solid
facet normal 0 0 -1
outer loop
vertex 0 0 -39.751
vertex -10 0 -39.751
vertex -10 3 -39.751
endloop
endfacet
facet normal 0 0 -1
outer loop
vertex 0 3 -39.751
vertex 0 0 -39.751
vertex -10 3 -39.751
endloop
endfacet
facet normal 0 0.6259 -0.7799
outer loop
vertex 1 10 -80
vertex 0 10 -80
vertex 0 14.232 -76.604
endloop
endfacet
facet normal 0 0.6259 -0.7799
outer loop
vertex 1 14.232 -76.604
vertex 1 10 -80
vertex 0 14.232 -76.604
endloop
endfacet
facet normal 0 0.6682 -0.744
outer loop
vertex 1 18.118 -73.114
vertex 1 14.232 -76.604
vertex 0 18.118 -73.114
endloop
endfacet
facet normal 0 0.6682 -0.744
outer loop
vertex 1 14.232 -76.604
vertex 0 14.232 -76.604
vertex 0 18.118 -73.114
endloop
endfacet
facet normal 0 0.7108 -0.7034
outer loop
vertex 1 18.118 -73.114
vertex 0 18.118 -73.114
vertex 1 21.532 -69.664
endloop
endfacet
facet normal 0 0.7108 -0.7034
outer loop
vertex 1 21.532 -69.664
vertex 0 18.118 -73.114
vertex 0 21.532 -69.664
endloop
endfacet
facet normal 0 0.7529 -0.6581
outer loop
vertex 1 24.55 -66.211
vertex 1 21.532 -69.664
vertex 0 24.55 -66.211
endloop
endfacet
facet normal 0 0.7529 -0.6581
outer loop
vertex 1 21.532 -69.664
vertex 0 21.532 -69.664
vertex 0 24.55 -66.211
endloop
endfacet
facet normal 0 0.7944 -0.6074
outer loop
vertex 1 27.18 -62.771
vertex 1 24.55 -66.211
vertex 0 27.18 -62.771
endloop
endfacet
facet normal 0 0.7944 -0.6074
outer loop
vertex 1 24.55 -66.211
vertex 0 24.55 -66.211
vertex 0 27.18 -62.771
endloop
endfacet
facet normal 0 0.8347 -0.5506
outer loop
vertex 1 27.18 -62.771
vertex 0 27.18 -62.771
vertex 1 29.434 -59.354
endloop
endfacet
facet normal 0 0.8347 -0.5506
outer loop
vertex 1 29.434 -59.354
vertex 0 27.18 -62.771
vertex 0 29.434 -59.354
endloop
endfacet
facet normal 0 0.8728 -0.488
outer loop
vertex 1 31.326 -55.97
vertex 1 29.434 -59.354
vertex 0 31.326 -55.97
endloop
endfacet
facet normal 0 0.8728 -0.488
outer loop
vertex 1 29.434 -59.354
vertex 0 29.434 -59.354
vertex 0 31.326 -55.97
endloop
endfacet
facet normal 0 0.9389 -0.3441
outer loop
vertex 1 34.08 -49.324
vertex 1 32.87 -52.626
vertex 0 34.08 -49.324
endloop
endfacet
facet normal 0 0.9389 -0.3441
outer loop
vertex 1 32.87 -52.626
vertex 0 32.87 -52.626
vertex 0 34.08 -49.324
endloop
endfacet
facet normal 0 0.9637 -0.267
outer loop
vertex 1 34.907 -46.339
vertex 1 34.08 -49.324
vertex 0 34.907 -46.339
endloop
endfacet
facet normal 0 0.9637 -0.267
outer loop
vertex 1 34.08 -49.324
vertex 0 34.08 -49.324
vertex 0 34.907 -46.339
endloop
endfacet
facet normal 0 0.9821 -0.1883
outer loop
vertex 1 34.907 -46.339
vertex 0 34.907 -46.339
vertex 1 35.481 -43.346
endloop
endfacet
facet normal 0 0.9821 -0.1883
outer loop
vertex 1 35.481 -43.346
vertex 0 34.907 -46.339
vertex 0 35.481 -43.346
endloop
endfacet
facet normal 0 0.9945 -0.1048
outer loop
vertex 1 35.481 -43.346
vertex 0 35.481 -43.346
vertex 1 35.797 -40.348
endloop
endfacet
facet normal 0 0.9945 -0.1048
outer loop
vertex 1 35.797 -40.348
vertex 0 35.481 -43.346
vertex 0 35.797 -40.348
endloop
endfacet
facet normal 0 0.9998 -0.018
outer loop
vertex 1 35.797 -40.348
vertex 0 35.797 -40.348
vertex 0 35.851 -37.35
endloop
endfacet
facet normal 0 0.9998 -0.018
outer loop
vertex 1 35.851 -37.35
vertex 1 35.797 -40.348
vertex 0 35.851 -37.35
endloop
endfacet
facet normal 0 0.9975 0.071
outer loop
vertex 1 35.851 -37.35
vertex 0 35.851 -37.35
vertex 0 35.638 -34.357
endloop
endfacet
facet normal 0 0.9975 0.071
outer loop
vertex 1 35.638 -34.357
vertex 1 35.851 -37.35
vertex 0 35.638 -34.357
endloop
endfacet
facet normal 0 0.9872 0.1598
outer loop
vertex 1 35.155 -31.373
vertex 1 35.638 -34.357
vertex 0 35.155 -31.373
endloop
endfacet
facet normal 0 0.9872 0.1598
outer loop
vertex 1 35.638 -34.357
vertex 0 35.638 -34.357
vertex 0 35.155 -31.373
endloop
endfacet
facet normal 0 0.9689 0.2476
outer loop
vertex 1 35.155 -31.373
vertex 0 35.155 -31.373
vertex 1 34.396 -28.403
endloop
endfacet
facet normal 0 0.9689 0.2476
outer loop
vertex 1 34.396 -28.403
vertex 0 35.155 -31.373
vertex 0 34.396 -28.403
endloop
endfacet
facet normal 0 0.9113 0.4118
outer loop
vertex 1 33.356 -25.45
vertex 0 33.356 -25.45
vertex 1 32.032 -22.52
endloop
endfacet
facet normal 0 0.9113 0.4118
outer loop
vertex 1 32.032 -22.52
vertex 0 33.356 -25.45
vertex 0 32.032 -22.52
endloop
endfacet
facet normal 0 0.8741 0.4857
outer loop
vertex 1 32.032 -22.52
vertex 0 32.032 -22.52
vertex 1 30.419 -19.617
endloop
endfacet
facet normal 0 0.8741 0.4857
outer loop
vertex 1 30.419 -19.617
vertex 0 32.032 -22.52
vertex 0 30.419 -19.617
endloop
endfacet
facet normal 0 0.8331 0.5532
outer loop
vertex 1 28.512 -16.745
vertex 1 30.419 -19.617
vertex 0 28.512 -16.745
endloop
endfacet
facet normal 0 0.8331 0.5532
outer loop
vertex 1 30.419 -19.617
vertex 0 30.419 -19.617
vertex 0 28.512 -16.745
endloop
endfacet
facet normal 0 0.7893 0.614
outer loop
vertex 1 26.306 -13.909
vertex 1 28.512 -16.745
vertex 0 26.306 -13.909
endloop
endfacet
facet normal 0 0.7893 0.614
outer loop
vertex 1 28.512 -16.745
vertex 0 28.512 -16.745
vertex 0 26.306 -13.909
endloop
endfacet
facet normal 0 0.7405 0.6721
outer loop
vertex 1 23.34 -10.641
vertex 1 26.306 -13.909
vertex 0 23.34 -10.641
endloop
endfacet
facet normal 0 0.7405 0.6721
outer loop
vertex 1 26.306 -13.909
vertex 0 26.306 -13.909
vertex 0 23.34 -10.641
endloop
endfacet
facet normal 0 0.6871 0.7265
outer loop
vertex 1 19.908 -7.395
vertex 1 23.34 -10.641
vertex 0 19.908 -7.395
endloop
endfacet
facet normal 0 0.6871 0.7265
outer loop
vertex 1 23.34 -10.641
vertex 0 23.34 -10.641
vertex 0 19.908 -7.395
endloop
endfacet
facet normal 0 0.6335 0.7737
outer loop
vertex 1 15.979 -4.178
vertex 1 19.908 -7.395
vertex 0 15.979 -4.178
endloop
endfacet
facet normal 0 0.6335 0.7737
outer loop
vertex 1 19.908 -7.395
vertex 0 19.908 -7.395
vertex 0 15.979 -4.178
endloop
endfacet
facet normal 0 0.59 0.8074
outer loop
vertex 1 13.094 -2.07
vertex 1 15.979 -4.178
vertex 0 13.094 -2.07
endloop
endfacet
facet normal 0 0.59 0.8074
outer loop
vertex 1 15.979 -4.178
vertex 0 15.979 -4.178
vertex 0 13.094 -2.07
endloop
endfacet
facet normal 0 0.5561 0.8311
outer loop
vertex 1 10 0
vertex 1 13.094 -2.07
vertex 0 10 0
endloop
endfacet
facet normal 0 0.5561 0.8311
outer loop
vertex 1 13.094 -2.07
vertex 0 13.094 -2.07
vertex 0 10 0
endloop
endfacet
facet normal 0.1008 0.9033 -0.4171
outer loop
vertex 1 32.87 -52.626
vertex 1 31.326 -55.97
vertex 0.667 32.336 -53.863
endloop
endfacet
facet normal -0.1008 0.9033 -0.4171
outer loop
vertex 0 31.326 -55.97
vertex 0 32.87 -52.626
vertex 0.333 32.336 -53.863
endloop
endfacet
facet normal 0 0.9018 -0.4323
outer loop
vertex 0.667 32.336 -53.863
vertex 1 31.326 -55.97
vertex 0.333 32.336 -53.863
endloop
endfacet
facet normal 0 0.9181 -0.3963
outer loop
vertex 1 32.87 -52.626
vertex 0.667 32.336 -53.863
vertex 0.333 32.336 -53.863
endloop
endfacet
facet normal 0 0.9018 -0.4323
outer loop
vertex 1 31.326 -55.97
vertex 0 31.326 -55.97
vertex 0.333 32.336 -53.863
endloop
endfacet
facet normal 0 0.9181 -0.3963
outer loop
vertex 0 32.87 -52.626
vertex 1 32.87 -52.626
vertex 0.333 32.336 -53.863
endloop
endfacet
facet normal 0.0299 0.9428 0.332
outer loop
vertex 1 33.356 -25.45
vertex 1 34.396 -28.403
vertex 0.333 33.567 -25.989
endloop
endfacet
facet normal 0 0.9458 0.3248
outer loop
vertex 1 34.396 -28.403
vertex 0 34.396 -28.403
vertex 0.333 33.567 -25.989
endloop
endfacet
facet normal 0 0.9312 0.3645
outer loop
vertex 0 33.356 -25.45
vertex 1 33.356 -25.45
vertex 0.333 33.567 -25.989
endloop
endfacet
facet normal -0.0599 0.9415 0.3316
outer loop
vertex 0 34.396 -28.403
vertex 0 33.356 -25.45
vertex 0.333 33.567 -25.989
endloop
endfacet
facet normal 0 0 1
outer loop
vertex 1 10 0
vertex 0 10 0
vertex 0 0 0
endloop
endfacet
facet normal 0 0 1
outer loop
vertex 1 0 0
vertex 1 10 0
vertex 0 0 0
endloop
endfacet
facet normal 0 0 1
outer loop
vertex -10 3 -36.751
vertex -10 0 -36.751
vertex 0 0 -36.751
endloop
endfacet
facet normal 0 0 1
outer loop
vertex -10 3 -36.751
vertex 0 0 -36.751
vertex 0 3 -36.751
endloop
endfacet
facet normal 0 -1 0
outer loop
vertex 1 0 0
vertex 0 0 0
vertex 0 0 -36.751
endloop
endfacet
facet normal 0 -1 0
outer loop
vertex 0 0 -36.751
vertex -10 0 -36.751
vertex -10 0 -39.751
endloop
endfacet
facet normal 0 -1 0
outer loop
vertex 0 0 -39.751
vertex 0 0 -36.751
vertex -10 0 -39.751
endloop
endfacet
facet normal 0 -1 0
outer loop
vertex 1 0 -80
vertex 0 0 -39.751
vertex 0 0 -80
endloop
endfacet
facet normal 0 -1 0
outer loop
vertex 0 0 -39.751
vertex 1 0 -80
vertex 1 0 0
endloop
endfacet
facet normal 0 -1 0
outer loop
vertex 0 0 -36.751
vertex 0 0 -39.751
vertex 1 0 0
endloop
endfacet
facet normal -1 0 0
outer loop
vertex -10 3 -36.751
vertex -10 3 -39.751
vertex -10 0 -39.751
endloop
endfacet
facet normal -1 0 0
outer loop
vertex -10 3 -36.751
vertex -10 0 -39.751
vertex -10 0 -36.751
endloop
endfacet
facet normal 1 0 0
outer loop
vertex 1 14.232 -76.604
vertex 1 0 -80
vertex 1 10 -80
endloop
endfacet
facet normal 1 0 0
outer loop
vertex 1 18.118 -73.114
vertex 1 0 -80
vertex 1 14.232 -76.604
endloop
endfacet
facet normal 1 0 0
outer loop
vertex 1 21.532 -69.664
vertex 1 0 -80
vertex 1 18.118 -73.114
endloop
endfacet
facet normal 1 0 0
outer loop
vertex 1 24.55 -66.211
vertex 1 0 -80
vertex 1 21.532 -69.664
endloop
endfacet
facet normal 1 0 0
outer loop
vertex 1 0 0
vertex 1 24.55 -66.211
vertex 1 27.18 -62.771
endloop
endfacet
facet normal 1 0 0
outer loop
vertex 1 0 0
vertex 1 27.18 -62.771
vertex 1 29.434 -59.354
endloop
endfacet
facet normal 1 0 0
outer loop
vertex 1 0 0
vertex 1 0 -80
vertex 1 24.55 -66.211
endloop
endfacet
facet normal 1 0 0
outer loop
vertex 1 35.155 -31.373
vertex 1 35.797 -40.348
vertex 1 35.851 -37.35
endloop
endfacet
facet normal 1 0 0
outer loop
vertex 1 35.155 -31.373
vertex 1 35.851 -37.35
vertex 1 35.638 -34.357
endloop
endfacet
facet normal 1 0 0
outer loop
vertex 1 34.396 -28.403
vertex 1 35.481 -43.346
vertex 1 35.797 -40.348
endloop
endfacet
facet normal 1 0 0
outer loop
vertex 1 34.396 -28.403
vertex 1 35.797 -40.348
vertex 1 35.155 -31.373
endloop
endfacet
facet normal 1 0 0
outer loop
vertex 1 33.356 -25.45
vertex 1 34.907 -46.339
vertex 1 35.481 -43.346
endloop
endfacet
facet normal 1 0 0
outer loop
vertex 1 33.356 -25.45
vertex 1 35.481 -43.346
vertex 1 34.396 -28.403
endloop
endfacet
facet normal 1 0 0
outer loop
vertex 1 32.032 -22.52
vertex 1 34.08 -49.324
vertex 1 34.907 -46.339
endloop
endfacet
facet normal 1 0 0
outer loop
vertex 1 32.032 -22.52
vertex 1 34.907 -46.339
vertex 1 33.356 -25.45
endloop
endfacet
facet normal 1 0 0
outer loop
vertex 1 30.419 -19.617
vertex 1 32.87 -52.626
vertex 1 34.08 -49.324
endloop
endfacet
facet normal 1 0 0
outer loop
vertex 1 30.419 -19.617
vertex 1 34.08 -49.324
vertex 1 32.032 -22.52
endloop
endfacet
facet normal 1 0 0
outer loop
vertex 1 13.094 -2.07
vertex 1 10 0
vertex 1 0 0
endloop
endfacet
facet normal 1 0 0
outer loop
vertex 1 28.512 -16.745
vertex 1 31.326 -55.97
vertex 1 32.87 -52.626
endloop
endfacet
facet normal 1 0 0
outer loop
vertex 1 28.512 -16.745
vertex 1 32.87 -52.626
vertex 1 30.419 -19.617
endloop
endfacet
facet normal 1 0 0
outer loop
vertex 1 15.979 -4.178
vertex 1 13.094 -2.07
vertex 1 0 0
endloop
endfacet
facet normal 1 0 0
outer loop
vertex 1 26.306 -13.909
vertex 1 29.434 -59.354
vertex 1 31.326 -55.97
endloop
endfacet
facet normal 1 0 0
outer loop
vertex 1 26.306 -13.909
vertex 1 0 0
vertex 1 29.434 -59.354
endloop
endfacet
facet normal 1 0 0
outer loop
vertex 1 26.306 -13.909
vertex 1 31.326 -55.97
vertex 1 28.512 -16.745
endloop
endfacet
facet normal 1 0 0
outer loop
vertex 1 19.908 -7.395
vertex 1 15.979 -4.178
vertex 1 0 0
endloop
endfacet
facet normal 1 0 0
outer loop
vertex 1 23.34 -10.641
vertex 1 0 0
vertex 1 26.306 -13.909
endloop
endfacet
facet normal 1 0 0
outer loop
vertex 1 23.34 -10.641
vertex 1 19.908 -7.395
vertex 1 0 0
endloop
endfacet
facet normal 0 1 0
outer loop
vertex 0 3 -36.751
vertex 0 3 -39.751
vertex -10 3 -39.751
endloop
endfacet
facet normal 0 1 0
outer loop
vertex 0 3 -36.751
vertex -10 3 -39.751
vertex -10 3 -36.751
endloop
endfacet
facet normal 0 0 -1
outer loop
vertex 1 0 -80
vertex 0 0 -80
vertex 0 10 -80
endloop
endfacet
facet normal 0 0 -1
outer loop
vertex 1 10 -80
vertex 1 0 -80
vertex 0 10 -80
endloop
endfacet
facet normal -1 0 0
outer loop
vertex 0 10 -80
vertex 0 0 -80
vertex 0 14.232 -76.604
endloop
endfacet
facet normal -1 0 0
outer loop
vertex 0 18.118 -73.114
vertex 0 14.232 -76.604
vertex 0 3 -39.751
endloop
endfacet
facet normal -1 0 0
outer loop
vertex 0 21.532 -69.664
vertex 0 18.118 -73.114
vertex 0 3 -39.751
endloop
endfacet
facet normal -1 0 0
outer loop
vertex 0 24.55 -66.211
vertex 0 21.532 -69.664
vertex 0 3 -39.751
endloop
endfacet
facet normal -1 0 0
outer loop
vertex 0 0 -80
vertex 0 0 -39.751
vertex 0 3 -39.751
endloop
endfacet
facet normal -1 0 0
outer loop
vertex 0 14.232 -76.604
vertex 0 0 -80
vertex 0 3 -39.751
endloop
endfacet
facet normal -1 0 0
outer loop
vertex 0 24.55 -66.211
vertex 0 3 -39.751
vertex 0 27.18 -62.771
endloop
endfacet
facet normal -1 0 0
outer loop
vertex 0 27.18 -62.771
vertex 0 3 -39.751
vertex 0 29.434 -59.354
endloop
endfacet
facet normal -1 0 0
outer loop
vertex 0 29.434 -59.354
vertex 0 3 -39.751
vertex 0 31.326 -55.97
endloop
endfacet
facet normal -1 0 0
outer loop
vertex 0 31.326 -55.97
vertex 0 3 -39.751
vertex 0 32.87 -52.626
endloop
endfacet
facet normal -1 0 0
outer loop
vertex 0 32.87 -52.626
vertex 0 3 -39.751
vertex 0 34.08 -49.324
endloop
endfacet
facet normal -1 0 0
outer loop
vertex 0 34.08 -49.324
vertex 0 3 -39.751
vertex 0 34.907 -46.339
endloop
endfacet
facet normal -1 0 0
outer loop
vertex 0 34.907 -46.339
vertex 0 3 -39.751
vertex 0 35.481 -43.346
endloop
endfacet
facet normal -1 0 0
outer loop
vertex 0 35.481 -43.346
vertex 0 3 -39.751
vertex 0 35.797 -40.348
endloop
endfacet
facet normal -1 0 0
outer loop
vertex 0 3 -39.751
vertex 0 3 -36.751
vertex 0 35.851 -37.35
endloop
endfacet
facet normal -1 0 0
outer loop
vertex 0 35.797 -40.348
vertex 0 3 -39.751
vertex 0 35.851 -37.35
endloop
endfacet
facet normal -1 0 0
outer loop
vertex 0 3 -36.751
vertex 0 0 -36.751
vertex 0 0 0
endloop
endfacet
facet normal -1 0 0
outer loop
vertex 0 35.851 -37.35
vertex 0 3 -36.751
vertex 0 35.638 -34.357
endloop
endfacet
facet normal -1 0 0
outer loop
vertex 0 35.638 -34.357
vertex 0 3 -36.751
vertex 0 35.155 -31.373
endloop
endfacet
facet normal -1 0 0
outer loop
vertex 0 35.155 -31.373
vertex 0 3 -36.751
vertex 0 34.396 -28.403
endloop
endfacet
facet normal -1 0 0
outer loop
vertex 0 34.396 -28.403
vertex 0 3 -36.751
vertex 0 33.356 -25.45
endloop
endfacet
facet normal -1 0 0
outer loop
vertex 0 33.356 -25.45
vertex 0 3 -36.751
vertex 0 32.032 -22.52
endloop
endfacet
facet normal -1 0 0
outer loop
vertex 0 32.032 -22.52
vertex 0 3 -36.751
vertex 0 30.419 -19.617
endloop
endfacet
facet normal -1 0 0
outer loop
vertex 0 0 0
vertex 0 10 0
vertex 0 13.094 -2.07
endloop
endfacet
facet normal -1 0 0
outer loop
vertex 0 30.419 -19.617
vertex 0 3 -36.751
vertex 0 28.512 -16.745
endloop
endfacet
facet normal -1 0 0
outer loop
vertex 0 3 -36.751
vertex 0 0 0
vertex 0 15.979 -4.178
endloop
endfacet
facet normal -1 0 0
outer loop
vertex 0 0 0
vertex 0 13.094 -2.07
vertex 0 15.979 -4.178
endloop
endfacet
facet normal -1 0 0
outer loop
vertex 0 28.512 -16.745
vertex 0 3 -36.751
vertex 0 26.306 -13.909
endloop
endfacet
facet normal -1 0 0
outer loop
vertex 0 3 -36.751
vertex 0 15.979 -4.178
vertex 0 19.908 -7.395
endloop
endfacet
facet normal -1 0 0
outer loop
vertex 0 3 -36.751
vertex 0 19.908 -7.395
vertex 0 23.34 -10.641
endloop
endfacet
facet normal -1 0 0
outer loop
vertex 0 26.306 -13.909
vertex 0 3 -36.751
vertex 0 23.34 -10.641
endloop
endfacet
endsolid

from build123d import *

# Parameters (mm, degrees)
THICKEN1_DEPTH      = 1
SKETCH6_W           = 3
SKETCH6_H           = 3
BOSS_EXTRUDE1_DEPTH = 10


# Read off the part's stored shape, not the designer's step: Thicken1
with BuildPart() as part:
    # Thicken1 outline → Thicken1 (new body)
    with BuildSketch(Plane.YZ):
        with BuildLine():
            add(Edge.make_bspline(
                [(10, -80), (41.657742077, -55.94021324), (47.197734967, -23.837728835), (10, 0)],
                knots=[0, 0, 0, 0, 1, 1, 1, 1], degree=3))
            Line((10, 0), (0, 0))
            Line((0, 0), (0, -80))
            Line((0, -80), (10, -80))
        make_face()
    extrude(amount=THICKEN1_DEPTH)

    # Sketch6 → Boss-Extrude1 (add)
    with BuildSketch(Plane.ZY):
        with Locations((-38.250665785, 1.5)):
            Rectangle(SKETCH6_W, SKETCH6_H)
    extrude(amount=BOSS_EXTRUDE1_DEPTH)


solid = part.part
